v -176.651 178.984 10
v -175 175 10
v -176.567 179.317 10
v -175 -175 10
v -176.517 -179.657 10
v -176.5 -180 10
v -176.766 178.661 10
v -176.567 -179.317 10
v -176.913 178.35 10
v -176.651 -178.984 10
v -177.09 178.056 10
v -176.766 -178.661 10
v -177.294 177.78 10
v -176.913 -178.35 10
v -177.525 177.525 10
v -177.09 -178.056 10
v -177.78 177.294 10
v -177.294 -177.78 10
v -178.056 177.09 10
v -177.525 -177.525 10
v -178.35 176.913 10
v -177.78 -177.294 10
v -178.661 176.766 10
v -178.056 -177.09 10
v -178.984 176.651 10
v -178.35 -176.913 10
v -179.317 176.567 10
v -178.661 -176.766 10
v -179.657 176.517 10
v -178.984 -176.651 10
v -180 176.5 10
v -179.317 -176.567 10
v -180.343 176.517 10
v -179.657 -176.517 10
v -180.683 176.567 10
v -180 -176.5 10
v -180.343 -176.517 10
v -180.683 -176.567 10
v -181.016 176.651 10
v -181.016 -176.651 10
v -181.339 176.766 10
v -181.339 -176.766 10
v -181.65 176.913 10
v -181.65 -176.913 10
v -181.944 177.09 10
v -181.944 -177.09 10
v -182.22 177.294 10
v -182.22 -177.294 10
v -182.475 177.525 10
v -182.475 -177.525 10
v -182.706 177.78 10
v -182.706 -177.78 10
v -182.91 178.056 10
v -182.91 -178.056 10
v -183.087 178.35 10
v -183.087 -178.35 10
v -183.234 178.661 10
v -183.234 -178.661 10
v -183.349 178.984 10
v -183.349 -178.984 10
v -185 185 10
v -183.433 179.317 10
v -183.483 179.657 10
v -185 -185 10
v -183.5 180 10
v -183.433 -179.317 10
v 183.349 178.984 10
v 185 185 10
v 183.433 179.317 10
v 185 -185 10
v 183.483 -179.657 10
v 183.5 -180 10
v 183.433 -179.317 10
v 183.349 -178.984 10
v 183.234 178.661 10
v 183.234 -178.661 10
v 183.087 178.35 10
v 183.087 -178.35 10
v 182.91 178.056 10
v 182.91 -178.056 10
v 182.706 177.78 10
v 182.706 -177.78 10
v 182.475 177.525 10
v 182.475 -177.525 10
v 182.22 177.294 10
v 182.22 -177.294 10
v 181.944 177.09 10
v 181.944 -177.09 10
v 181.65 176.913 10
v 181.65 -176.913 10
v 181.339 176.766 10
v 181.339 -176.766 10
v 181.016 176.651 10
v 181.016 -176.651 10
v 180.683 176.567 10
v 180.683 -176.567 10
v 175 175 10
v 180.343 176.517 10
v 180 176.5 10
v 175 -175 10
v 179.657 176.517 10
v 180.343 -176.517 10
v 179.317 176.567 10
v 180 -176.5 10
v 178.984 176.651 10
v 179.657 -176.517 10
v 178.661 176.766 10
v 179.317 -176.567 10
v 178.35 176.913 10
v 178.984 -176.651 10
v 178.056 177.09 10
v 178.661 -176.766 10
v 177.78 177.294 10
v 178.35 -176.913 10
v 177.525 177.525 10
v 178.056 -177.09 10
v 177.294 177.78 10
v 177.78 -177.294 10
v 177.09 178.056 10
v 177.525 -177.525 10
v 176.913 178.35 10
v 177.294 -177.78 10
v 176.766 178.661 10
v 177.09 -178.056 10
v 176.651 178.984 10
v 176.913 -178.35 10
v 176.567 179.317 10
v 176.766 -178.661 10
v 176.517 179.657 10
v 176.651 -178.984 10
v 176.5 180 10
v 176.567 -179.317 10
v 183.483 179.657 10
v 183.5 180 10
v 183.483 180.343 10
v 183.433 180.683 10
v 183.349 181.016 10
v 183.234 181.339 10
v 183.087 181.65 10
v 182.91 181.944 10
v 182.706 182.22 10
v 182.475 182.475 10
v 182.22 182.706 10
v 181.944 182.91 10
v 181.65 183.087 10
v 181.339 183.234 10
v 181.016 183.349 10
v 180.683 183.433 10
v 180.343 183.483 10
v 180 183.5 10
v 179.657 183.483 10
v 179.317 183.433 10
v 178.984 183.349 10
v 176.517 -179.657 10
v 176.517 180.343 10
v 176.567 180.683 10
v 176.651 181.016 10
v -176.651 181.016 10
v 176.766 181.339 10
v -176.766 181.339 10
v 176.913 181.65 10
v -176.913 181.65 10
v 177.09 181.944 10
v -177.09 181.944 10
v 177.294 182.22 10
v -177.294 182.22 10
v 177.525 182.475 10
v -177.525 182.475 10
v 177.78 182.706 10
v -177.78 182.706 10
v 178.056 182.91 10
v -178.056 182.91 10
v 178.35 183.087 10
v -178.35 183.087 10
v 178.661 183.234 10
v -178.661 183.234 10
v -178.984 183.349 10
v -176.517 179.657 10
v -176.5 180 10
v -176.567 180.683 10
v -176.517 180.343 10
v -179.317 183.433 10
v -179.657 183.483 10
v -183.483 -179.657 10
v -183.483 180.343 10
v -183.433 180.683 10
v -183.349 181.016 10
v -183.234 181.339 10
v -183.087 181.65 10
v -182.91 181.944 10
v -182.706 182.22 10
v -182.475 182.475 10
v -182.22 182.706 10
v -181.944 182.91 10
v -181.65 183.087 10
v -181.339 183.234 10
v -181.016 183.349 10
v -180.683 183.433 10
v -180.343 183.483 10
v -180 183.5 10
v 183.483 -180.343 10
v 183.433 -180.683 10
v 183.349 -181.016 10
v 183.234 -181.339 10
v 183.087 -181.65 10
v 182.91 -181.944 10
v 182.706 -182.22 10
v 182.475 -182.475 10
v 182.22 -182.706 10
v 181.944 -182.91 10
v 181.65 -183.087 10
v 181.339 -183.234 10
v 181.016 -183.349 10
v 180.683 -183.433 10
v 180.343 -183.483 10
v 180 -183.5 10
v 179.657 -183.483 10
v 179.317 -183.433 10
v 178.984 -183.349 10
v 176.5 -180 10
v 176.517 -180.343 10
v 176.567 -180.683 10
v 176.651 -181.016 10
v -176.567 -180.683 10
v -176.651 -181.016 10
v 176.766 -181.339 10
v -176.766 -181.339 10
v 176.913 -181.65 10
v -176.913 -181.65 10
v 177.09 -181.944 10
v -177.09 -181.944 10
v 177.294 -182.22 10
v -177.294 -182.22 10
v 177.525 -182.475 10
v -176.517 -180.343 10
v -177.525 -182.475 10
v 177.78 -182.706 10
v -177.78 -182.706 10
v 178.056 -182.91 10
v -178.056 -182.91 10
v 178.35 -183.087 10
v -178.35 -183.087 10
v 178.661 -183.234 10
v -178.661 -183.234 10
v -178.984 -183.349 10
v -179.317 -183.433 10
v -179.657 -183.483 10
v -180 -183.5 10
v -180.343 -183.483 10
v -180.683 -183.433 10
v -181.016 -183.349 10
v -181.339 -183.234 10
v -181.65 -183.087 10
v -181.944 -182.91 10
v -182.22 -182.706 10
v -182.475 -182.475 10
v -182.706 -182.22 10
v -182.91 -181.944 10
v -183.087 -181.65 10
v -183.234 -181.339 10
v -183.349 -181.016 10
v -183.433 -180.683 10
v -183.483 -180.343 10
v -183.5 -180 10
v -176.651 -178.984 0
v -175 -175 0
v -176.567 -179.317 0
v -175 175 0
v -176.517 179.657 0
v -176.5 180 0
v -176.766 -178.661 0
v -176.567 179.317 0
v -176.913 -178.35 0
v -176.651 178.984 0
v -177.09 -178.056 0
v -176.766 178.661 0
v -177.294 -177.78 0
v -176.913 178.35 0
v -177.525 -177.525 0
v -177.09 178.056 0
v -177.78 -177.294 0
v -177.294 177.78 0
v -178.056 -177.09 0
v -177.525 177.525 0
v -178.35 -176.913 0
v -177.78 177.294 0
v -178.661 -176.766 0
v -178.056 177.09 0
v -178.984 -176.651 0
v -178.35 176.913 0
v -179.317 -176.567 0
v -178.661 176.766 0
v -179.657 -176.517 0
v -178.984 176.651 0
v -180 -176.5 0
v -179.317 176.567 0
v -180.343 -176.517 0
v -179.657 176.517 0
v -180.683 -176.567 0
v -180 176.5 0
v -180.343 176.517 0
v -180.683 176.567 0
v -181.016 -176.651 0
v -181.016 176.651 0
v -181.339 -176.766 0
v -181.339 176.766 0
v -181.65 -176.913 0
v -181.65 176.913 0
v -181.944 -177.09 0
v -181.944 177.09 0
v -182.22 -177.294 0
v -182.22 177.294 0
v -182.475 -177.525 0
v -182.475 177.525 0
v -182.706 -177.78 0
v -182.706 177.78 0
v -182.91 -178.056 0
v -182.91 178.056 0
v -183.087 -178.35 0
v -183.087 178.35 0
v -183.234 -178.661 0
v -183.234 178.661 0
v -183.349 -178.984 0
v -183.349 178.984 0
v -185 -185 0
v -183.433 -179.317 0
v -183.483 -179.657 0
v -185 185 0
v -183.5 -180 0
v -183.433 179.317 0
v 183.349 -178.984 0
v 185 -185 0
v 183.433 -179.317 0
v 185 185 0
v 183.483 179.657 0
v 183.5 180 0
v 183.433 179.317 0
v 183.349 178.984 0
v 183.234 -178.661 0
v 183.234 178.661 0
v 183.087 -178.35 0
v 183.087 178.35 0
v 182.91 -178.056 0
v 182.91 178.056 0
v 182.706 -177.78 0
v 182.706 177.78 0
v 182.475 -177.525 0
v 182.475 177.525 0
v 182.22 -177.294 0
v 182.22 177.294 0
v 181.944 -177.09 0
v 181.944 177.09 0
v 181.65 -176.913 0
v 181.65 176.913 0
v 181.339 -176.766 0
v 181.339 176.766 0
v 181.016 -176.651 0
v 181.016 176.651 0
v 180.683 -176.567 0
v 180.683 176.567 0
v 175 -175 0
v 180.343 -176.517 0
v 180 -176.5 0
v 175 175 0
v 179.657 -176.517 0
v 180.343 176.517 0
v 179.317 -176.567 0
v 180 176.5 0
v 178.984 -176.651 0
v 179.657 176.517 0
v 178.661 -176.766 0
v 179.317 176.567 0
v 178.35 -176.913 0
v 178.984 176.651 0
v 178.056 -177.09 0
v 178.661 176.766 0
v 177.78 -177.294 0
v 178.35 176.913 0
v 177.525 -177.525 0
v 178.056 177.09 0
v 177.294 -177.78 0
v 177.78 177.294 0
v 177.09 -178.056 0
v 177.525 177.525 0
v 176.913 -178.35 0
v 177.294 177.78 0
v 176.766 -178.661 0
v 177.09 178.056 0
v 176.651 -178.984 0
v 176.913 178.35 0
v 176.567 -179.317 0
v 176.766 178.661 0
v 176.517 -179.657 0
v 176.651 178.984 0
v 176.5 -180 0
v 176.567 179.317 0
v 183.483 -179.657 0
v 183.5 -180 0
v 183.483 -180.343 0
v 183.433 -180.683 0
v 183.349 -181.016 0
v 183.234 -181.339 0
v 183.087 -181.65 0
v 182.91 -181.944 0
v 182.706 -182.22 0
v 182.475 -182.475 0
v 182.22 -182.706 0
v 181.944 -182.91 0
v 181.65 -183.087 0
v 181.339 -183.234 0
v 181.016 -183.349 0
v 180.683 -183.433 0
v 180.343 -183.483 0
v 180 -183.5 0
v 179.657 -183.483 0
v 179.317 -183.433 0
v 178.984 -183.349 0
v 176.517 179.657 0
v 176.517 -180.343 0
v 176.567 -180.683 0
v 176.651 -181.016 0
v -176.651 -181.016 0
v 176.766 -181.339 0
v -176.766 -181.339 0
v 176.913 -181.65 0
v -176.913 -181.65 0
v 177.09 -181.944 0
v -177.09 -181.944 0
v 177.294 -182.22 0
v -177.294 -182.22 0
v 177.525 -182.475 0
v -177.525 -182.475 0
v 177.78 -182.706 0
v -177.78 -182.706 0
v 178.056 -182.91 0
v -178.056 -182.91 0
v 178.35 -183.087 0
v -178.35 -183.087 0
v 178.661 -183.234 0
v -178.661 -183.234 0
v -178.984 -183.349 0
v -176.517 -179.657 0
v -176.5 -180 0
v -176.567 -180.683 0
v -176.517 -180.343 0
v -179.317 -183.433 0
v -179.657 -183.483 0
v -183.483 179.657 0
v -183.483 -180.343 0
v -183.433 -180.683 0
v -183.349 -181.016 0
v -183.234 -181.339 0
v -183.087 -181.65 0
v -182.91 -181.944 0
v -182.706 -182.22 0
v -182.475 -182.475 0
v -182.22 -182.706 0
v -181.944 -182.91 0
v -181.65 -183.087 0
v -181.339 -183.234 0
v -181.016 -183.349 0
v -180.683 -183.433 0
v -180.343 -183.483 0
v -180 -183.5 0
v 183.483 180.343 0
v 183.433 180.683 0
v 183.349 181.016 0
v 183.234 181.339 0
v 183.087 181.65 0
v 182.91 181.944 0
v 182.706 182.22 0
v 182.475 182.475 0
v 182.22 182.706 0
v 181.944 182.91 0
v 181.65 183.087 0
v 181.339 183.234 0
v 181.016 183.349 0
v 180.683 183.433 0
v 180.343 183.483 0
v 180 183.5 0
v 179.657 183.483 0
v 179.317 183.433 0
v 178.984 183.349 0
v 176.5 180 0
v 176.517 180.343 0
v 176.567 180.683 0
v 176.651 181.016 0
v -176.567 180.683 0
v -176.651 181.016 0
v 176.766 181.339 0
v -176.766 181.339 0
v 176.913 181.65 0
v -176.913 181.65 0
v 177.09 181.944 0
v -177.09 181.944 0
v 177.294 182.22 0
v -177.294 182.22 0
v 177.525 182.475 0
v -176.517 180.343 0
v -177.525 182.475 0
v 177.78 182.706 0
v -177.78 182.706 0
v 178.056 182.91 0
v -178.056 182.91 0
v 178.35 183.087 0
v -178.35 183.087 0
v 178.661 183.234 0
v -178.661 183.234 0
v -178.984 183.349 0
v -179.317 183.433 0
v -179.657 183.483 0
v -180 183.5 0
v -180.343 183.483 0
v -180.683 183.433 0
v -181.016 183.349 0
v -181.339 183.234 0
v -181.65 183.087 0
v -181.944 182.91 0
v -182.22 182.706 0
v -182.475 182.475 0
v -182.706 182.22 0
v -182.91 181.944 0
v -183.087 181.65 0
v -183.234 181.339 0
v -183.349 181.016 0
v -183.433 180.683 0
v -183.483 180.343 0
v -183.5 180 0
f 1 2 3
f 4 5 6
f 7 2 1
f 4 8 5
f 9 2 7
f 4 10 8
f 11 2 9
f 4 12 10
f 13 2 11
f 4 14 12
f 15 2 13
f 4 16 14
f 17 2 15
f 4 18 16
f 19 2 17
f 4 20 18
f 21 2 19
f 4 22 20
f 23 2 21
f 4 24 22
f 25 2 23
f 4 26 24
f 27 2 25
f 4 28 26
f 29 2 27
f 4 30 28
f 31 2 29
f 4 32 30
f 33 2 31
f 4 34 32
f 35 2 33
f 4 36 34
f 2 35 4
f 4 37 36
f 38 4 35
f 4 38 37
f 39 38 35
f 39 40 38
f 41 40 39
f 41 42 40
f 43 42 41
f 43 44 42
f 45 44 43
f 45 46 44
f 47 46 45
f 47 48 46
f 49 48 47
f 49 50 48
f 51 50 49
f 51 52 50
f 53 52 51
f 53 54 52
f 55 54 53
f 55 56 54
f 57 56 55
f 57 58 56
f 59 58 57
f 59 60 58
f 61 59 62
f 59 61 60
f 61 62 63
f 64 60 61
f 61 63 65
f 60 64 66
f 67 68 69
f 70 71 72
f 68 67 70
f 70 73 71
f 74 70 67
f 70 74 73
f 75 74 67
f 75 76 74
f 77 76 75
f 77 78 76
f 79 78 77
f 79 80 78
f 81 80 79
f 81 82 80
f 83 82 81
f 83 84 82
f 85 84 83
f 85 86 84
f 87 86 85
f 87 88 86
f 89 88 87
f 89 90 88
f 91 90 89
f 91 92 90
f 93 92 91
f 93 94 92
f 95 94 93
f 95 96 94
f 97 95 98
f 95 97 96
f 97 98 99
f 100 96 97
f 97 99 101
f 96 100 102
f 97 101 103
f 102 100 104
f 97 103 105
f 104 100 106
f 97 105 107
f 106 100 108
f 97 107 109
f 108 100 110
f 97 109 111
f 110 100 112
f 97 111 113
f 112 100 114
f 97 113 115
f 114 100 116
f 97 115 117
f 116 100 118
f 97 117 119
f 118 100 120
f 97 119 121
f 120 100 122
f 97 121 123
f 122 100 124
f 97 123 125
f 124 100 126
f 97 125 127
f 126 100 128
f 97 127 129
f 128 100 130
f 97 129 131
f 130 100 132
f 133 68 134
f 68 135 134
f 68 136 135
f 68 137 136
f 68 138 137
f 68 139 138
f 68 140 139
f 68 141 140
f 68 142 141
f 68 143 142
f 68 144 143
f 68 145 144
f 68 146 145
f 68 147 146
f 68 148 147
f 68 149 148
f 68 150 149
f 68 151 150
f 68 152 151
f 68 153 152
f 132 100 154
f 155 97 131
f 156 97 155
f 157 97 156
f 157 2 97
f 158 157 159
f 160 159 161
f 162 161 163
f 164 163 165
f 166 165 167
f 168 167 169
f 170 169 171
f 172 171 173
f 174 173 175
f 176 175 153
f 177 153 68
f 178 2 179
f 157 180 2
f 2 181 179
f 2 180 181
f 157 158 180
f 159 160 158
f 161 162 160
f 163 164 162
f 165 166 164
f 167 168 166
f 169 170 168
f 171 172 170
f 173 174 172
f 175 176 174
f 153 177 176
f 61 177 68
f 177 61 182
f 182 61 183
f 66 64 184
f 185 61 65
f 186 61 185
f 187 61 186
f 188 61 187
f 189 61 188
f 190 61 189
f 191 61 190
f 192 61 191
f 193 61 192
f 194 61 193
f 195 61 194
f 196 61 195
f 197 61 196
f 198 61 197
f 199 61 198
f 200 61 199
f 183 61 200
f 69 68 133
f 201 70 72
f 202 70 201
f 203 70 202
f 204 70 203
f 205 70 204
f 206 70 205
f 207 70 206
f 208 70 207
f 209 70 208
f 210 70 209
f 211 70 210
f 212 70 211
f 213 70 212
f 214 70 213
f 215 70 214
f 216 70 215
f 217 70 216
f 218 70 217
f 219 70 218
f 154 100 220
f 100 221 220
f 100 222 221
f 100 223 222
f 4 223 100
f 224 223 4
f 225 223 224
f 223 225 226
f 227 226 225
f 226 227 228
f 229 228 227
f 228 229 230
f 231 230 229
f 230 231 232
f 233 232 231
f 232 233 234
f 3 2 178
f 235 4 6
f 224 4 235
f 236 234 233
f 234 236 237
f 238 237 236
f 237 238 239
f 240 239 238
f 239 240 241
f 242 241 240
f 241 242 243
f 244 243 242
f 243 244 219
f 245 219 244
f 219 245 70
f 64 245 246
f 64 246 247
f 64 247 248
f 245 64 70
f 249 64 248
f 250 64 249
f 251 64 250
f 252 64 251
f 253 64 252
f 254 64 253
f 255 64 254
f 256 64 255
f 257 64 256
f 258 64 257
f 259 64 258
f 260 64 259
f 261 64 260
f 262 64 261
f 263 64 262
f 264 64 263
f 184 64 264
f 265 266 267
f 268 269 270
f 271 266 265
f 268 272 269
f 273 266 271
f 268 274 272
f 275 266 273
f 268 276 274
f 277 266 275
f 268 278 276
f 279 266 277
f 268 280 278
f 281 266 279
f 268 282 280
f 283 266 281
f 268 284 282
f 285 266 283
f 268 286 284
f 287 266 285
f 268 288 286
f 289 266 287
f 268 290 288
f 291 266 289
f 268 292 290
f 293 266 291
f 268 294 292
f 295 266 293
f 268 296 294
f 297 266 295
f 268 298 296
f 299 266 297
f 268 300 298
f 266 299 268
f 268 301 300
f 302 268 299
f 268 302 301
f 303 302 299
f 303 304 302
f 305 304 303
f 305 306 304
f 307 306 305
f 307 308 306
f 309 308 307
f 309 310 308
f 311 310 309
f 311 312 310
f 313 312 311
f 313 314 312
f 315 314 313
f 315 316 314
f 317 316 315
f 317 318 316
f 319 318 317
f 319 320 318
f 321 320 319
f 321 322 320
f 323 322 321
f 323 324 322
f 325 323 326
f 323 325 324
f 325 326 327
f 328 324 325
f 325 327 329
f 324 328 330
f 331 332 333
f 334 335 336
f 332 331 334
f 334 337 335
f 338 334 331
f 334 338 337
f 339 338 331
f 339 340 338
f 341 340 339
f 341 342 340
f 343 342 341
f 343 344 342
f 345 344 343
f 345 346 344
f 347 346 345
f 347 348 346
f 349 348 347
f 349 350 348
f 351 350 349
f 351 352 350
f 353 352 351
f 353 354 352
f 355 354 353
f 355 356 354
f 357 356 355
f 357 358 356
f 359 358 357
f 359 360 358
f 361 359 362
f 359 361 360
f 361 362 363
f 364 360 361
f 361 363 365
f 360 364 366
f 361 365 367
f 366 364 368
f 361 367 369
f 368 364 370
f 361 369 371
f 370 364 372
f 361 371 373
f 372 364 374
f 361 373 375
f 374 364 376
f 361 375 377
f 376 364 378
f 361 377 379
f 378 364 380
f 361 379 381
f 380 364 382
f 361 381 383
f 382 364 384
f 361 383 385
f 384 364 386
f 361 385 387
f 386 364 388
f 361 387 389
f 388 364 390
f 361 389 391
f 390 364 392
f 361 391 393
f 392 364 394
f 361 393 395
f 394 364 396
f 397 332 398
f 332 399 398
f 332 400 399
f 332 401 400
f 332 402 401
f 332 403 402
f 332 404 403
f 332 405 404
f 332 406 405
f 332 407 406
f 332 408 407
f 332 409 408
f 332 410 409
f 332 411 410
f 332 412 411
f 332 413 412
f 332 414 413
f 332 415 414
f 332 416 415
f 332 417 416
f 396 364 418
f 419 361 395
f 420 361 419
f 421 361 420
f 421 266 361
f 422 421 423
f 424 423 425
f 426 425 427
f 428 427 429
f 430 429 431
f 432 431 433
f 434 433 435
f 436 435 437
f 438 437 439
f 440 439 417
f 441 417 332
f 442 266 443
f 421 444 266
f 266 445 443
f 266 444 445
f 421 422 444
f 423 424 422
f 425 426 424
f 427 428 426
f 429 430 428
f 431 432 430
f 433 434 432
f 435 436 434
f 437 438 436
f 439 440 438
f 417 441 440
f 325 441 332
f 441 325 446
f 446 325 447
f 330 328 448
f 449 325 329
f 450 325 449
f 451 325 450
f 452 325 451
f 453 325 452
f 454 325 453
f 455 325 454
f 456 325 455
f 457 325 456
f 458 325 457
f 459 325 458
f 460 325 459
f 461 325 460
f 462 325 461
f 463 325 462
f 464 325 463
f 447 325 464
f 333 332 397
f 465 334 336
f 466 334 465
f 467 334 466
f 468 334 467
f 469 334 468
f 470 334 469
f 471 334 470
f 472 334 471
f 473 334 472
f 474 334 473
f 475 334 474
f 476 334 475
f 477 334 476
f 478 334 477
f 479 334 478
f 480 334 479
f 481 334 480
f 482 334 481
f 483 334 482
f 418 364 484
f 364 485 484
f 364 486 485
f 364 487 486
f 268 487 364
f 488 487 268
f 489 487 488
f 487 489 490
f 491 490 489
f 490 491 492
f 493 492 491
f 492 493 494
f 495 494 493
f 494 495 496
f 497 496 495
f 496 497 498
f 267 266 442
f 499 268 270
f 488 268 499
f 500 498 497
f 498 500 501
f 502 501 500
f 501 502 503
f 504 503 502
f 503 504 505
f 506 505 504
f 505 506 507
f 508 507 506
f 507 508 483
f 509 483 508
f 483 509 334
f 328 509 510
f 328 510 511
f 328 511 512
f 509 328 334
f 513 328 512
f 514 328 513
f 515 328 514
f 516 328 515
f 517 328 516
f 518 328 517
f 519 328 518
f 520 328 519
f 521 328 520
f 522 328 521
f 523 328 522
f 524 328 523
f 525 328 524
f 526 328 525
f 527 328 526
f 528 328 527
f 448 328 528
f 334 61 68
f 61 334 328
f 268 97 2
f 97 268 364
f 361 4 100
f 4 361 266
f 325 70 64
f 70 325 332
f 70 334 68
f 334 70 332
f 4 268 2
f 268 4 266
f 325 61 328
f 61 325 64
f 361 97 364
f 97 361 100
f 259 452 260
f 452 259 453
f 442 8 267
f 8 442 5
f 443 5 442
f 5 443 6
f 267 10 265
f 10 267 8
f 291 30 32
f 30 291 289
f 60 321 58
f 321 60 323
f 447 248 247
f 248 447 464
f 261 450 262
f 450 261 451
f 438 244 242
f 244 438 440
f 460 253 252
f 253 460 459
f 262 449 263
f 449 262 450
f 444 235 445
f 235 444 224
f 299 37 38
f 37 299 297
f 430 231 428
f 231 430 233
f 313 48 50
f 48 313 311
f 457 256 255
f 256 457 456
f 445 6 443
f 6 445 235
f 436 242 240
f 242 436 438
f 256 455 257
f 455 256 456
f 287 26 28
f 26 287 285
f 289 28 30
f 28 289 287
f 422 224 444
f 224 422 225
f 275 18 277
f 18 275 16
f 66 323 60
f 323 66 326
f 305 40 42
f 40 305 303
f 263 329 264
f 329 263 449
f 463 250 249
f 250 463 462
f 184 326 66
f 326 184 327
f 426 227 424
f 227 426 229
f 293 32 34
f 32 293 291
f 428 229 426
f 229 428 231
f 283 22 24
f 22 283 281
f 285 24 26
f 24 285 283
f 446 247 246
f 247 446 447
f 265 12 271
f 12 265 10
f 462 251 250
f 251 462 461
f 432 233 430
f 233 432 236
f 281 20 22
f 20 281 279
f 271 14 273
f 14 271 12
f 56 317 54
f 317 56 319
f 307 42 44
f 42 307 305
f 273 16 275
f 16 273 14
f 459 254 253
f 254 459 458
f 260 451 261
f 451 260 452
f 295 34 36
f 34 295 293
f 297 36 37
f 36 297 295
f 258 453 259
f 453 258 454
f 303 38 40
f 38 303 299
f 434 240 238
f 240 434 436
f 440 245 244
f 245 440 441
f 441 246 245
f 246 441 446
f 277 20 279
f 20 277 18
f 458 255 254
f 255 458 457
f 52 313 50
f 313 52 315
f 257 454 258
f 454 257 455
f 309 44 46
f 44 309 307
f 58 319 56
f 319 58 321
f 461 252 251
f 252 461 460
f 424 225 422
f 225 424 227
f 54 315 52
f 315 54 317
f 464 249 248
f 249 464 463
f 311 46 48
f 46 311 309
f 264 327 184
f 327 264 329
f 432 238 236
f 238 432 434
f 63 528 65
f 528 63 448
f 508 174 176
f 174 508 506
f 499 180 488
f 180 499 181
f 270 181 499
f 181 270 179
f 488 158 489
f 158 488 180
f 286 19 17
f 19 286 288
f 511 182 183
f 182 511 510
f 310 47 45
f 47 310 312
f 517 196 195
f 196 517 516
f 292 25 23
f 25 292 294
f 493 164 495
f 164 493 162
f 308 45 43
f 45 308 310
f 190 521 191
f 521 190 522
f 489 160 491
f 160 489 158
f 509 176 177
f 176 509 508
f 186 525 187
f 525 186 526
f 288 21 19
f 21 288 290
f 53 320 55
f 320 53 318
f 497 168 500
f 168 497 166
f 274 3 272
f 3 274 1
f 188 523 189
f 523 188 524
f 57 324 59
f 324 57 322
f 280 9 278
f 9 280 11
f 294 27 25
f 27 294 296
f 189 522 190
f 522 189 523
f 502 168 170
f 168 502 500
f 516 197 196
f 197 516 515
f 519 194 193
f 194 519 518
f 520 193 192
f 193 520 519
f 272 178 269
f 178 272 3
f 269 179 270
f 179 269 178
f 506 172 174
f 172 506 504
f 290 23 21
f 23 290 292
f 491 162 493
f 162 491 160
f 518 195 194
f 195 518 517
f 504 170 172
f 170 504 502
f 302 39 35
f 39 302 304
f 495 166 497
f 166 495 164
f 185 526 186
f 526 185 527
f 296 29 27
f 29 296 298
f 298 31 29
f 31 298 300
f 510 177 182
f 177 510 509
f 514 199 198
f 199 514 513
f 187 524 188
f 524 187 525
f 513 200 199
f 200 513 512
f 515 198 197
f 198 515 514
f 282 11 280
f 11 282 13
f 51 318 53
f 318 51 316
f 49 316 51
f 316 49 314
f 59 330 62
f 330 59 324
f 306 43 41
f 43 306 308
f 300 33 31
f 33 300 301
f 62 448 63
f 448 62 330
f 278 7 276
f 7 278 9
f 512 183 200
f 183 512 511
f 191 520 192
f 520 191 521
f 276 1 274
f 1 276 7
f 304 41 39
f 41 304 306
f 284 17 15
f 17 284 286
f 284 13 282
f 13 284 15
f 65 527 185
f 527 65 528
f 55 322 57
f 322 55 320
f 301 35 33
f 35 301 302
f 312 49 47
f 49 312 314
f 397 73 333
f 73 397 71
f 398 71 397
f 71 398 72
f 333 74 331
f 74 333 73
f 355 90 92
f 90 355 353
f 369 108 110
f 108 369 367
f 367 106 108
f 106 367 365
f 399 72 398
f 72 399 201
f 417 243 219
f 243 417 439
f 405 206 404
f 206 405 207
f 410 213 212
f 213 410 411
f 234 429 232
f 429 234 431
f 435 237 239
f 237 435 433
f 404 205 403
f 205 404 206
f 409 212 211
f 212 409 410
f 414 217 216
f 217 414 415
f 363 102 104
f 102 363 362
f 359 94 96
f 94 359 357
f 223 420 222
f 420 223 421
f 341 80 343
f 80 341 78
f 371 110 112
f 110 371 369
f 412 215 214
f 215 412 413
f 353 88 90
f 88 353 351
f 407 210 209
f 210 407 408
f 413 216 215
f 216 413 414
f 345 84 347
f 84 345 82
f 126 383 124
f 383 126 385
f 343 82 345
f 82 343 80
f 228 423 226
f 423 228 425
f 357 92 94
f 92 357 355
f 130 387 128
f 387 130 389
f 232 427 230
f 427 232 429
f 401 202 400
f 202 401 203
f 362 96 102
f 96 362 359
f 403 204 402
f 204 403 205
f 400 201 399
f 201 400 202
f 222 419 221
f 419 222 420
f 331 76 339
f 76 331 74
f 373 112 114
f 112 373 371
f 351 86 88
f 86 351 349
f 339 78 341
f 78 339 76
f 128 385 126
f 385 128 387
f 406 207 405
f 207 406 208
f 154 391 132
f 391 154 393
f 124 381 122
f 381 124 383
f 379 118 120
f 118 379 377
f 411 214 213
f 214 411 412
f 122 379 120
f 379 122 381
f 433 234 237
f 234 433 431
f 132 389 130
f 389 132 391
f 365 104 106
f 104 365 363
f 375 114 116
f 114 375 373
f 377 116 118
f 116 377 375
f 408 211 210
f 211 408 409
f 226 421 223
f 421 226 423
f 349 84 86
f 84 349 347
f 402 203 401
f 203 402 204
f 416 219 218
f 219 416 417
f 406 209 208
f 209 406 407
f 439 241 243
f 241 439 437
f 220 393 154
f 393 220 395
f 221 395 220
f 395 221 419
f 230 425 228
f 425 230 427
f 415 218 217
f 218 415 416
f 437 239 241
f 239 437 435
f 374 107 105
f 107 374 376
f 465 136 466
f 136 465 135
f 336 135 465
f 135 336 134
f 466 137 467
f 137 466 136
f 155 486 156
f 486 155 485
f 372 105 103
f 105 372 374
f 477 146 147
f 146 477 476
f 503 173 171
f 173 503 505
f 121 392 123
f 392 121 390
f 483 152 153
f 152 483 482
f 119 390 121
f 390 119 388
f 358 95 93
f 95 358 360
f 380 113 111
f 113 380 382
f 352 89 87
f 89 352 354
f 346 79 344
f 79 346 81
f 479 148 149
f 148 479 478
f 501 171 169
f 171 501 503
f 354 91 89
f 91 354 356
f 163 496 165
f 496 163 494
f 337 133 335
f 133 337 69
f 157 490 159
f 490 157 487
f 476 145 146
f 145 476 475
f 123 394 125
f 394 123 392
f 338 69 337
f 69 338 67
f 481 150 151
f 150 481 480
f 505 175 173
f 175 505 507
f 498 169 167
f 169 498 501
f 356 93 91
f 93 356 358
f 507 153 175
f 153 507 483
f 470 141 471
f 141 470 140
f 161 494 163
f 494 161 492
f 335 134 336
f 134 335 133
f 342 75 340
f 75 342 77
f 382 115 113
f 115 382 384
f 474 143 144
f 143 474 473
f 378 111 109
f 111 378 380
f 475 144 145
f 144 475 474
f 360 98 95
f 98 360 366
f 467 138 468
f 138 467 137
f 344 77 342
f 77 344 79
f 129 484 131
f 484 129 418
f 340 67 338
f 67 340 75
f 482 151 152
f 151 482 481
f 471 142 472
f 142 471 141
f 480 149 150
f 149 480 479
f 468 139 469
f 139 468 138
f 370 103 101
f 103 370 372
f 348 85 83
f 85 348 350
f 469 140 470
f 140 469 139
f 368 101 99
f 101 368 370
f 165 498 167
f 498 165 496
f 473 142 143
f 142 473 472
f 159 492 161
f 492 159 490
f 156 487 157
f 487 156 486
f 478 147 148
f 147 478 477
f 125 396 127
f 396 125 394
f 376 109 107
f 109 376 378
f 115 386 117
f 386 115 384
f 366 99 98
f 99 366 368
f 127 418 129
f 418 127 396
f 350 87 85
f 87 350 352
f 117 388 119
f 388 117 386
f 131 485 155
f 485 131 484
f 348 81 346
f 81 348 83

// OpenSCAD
// ring_00.scad - ring index 0 (z bottom = 0 mm)
// Layer is 10 mm tall; bars are 10 mm square.
$fn = 64;
bar = 10; // 10 mm thickness in Z for each layer
half_b = bar/2;
outer = 370; half_outer = outer/2;
front_y = 180; back_y = -180; left_x = -180; right_x = 180;
x_centers = [-170, -100, -30, 40, 110, 180];
// Horizontal bar centers (Z centers) where bars exist on face planes; these are the 11 grid levels
z_centers = [5, 85, 155, 225, 295, 365, 435, 505, 575, 645, 715];
ring_z = 0; // this layer bottom (global Z)

module place_box(cx, cy, sx, sy) {
  translate([cx - sx/2, cy - sy/2, 0])
    cube([sx, sy, bar]);
}

difference() {
  union() {
    // vertical bars on front and back faces (present every layer)
    for (x = x_centers) {
      place_box(x, front_y, bar, bar);
      place_box(x, back_y, bar, bar);
    }
    // vertical bars on left and right faces
    for (y = x_centers) {
      place_box(left_x, y, bar, bar);
      place_box(right_x, y, bar, bar);
    }

    // horizontal bars (X-direction on front/back, Y-direction on left/right) appear only in layers that intersect their Z extents
    for (zc = z_centers) {
      if ((zc - half_b < ring_z + bar) && (zc + half_b > ring_z)) {
        // front/back horizontal (X across full width)
        translate([-half_outer, front_y - half_b, 0]) cube([outer, bar, bar]);
        translate([-half_outer, back_y - half_b, 0])  cube([outer, bar, bar]);
        // left/right horizontal (Y across full depth)
        translate([left_x - half_b, -half_outer, 0])  cube([bar, outer, bar]);
        translate([right_x - half_b, -half_outer, 0]) cube([bar, outer, bar]);
      }
    }
  }
  // Subtract the 4 rod holes (7 mm diameter) at corners for the M6 rods (clearance)
  for (cx = [-180, 180])
    for (cy = [-180, 180])
      translate([cx, cy, 0])
        cylinder(h = bar, r = 3.5, $fn = 64);
}
